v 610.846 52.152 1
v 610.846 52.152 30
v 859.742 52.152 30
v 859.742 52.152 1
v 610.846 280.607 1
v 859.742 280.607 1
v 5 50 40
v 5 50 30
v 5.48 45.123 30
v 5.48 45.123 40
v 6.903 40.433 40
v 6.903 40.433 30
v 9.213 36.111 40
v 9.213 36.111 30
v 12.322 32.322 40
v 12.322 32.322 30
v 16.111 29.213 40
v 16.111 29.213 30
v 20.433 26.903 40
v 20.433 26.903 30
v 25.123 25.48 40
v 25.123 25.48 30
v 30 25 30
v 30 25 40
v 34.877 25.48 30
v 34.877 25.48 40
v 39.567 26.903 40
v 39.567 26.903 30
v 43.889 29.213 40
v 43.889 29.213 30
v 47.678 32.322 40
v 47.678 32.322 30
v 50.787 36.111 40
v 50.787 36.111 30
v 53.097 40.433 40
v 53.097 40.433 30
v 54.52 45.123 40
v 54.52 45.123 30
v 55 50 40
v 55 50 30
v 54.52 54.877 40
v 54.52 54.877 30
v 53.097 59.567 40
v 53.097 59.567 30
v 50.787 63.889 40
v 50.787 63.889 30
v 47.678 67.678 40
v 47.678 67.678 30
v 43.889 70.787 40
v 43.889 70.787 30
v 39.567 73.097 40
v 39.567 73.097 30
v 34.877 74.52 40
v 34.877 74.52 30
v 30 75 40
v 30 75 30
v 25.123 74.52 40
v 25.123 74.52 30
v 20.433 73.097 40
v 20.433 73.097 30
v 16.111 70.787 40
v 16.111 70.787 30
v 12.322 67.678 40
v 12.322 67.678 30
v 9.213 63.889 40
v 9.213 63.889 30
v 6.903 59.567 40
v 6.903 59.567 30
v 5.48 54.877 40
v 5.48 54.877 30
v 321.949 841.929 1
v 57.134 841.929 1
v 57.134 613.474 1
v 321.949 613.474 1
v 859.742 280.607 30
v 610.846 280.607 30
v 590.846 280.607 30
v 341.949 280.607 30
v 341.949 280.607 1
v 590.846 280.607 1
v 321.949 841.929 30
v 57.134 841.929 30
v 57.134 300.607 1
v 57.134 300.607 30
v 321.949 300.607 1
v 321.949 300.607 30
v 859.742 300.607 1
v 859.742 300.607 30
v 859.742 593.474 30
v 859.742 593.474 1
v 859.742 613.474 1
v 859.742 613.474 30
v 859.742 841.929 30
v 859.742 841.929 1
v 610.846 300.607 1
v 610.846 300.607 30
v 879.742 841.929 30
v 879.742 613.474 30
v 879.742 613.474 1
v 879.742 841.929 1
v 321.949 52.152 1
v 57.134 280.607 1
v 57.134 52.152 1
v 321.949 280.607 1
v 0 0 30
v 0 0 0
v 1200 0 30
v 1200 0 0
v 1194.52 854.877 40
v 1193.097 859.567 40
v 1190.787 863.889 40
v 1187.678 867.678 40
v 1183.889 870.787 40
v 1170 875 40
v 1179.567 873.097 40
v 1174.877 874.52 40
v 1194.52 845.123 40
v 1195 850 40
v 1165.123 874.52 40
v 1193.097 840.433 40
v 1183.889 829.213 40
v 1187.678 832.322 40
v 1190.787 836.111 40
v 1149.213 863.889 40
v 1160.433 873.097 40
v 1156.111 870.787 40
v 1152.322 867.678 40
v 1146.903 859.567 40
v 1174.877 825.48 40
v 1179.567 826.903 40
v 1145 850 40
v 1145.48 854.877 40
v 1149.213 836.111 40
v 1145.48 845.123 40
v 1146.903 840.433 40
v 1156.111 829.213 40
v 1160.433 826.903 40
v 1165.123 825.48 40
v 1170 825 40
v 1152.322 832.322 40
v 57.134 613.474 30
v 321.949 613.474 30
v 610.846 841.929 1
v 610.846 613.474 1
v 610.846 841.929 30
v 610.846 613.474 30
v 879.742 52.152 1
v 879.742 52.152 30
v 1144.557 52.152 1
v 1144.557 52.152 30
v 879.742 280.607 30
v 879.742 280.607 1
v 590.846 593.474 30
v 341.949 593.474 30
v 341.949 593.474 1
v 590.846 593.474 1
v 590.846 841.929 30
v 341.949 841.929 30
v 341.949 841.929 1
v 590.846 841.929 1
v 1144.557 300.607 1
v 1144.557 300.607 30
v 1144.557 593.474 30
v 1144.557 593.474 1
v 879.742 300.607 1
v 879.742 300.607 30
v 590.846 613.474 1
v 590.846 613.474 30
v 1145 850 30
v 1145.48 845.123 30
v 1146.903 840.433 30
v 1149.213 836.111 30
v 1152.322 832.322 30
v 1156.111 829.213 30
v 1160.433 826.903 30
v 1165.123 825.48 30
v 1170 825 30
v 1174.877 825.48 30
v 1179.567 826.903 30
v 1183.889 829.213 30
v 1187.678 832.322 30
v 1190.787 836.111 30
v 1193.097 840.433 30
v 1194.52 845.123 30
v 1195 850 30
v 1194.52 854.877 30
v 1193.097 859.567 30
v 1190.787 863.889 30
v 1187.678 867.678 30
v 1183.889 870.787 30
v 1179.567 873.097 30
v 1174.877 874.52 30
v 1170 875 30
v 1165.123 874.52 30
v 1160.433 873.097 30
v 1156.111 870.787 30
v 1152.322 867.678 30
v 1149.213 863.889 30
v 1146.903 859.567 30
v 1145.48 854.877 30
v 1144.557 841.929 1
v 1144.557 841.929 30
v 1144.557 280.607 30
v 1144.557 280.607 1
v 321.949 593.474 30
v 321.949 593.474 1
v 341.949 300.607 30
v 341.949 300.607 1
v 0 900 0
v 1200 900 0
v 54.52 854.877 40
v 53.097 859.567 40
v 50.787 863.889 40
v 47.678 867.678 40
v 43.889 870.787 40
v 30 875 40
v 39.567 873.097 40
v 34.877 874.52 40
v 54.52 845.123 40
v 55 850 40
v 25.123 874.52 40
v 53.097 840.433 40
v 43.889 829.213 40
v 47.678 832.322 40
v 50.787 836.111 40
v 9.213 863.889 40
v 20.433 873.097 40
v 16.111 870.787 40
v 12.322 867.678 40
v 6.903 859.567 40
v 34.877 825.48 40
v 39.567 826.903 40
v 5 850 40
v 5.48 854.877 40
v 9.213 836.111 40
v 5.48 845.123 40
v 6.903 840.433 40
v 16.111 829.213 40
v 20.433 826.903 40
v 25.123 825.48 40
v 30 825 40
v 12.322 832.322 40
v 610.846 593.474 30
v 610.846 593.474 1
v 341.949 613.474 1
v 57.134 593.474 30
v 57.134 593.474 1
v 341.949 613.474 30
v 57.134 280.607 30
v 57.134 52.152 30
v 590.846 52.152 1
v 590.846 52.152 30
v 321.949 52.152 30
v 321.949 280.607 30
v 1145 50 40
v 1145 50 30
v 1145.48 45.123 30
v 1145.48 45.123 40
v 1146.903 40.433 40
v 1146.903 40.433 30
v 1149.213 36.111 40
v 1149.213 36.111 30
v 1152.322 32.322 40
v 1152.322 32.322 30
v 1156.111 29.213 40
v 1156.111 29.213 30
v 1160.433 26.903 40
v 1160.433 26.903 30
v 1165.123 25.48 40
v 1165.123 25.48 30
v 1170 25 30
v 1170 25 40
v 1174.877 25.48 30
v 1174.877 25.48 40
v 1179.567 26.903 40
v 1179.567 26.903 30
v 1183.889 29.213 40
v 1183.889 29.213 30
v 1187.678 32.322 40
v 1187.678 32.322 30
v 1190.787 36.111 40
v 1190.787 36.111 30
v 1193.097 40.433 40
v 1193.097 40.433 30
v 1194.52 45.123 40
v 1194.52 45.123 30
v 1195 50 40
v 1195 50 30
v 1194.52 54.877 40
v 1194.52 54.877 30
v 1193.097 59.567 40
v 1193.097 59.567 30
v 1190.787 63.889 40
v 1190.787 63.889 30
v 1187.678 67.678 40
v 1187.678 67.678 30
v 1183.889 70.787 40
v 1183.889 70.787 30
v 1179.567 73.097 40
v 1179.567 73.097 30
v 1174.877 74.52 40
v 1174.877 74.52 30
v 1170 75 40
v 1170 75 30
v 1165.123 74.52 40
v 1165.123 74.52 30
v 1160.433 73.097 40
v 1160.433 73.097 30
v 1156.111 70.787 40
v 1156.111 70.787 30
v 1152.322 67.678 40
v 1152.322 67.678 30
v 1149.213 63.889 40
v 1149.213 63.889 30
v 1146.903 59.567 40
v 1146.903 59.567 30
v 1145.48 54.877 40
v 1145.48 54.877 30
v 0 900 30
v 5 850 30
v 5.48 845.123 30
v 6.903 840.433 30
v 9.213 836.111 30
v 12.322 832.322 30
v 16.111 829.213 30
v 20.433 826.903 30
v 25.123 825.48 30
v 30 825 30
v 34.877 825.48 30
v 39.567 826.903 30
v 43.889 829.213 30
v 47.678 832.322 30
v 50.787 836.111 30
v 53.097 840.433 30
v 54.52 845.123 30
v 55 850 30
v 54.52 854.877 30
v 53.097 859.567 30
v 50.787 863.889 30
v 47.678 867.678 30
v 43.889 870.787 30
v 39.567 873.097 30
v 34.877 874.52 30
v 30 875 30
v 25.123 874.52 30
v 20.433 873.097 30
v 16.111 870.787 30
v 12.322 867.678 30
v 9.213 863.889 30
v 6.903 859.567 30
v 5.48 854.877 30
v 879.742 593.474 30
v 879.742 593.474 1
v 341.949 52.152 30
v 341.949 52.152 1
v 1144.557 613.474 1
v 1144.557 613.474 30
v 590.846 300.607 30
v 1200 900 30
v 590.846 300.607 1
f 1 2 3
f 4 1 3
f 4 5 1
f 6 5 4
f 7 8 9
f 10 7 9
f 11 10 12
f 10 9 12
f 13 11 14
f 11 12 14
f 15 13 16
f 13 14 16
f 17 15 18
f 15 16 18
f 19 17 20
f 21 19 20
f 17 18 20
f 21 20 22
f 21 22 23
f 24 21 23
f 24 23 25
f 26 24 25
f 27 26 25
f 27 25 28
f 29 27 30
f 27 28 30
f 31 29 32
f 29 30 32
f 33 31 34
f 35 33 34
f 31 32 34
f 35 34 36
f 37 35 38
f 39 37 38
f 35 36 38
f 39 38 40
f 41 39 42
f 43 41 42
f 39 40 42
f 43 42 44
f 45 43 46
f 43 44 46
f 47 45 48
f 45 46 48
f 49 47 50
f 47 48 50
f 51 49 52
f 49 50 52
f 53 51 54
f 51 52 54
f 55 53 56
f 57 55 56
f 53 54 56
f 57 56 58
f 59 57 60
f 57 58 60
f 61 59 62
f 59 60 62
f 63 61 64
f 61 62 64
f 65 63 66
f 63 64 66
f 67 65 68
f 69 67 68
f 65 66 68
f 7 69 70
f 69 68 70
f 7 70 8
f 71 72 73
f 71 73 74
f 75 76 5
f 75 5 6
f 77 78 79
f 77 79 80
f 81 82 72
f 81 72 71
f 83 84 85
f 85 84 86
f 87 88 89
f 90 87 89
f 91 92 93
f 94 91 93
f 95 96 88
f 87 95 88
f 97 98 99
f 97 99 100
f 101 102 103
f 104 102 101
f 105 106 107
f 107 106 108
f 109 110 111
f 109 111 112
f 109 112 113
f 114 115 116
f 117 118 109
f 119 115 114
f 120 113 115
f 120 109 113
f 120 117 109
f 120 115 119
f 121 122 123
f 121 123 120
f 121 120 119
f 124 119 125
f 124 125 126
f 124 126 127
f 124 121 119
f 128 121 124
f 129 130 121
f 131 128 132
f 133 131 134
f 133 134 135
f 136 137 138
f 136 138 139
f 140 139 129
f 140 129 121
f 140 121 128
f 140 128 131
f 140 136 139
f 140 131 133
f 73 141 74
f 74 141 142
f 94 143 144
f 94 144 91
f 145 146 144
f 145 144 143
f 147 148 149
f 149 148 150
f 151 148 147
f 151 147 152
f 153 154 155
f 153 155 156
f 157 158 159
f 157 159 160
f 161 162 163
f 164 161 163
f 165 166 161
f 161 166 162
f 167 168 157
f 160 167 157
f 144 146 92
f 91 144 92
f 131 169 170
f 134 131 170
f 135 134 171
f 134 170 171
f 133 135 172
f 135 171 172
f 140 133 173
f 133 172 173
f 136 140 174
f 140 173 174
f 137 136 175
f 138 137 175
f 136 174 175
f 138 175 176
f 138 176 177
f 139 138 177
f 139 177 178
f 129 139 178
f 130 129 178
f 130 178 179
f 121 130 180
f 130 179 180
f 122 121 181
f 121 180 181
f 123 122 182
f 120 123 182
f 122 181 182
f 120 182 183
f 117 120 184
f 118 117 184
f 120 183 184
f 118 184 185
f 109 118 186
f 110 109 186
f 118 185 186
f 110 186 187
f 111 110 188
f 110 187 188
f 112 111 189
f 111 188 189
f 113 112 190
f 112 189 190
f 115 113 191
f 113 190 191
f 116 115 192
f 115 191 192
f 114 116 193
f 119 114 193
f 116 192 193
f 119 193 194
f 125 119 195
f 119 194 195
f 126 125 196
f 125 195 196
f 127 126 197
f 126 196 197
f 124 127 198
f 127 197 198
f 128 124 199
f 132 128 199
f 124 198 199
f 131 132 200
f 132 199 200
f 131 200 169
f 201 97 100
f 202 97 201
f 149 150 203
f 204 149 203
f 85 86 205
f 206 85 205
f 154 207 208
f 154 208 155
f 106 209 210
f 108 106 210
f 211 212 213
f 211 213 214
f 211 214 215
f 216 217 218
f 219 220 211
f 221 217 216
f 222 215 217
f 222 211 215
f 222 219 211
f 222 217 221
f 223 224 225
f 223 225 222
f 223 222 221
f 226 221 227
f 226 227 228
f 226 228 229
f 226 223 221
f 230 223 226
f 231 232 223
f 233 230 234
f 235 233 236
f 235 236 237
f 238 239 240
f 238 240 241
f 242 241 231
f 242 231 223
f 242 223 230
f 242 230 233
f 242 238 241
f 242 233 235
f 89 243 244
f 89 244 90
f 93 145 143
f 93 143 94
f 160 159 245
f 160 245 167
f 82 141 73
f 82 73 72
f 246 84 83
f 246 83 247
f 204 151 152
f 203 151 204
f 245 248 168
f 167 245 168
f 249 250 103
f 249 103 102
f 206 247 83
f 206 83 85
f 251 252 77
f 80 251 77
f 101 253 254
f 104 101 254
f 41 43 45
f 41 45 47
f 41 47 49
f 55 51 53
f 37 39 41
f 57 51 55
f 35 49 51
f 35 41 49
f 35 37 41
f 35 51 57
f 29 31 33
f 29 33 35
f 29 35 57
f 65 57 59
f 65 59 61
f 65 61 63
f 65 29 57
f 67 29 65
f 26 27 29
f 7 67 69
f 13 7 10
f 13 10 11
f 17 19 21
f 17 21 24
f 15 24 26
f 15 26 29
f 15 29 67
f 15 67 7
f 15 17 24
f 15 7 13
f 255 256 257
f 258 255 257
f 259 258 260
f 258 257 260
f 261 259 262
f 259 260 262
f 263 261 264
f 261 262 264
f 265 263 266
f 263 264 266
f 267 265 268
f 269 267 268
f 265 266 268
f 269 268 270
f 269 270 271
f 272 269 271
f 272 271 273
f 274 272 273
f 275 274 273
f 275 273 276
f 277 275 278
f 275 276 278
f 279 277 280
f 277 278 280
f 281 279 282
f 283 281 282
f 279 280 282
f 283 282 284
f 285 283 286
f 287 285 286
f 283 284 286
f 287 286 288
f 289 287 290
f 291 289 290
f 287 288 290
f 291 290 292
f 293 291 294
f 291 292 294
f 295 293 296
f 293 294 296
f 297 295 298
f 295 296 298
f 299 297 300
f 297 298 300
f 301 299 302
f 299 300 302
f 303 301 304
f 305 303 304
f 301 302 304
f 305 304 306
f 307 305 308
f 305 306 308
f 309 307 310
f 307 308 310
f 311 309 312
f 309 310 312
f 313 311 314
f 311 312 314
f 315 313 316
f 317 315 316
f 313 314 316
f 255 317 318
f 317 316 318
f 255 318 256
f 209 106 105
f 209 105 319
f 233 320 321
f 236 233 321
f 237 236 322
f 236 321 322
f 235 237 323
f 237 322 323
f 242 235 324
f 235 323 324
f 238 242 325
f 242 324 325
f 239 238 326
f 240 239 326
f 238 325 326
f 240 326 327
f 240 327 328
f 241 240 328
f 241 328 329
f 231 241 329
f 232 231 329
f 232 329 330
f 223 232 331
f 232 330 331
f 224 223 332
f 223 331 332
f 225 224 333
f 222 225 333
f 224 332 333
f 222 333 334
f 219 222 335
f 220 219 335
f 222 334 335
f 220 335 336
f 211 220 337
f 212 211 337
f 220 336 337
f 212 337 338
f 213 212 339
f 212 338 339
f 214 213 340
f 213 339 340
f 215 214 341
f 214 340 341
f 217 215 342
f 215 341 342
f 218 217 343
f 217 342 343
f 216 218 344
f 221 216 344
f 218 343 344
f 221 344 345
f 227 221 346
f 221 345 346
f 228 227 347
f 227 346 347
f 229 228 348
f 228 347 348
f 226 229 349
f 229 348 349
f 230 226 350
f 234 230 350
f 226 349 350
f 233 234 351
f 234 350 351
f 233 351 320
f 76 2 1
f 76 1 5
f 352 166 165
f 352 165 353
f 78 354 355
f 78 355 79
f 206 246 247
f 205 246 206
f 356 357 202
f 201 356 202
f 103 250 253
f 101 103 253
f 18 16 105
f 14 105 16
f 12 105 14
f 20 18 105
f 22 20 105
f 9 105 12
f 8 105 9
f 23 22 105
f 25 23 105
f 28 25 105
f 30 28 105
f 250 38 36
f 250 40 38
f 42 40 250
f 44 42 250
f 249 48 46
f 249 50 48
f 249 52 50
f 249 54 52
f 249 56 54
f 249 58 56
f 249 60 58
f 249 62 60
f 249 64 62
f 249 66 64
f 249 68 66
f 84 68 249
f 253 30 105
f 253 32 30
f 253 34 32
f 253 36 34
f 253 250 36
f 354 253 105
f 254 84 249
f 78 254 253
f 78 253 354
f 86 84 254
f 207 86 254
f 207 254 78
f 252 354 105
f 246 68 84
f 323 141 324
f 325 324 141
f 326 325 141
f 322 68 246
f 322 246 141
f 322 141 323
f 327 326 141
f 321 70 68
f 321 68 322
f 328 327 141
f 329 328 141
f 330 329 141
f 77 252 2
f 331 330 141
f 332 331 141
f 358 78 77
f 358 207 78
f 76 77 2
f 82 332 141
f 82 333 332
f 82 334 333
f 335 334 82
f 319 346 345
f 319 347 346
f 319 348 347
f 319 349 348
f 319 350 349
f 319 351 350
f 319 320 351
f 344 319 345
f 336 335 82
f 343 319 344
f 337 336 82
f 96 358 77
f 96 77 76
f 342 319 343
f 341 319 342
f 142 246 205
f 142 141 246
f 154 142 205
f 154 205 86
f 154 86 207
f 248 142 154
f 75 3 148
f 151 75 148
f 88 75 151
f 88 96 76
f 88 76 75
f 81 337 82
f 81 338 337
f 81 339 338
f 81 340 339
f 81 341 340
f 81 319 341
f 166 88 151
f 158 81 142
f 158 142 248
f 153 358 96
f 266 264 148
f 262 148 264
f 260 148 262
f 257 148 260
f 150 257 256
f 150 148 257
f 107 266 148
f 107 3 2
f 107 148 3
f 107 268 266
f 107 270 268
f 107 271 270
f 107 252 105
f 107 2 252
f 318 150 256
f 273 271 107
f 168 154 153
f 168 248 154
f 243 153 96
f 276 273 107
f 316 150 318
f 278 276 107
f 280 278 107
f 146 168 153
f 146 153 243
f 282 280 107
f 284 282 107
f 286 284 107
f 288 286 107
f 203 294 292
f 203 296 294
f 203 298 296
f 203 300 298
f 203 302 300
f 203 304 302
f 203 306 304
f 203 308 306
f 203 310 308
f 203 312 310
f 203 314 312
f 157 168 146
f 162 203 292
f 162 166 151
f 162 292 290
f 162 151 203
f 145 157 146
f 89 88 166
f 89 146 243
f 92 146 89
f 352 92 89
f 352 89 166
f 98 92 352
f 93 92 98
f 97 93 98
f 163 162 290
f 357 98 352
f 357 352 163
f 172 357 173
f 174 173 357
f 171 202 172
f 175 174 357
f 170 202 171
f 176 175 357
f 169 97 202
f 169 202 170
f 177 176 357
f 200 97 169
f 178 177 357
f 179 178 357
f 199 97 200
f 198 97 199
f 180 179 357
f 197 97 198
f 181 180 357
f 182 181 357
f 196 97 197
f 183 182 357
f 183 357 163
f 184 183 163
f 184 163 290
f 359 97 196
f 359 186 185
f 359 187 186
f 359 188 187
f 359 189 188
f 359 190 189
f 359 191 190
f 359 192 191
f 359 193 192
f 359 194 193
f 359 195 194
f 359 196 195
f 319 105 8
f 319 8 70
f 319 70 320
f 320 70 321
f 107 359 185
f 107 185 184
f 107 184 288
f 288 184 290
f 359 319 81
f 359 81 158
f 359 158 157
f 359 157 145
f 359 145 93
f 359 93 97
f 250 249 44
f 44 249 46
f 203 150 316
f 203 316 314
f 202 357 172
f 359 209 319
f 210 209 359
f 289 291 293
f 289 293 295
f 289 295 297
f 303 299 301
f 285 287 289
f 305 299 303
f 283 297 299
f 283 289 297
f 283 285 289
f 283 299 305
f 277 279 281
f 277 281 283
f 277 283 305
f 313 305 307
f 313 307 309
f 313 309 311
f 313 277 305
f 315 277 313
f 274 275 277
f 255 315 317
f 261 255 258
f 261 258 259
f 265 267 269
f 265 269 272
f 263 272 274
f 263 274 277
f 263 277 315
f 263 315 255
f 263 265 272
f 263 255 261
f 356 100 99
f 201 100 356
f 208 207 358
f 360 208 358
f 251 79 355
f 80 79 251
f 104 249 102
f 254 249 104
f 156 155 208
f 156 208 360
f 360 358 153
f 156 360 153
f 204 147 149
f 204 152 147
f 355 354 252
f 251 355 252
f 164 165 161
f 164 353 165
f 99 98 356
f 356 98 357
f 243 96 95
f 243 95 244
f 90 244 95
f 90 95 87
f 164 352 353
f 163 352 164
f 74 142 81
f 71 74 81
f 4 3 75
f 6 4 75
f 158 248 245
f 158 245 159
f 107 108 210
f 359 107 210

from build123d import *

# Parameters (mm, degrees)
SKETCH2_W           = 1200
SKETCH2_H           = 900
BOSS_EXTRUDE2_DEPTH = 30
SKETCH3_W           = 1087.423470631
SKETCH3_H           = 789.777232946
CUT_EXTRUDE2_DEPTH  = 29
RIB6_REACH          = 1502.3
SKETCH6_WALLS_W     = 20
SKETCH6_WALLS_H     = 3792.377172958
SKETCH6_WALLS_W_2   = 4090.023410643
SKETCH6_WALLS_H_2   = 20
SKETCH7_R           = 25
BOSS_EXTRUDE3_DEPTH = 10


with BuildPart() as part:
    # Sketch2 → Boss-Extrude2 (new body)
    with BuildSketch(Plane.XY):
        with Locations((600, 450)):
            Rectangle(SKETCH2_W, SKETCH2_H)
    extrude(amount=BOSS_EXTRUDE2_DEPTH)

    # Sketch3 → Cut-Extrude2 (cut)
    with BuildSketch(Plane.XY.offset(30)):
        with Locations((600.845585903, 447.040449341)):
            Rectangle(SKETCH3_W, SKETCH3_H)
    extrude(amount=-CUT_EXTRUDE2_DEPTH, mode=Mode.SUBTRACT)

    # Sketch6 walls → Rib6 (add, up to next)
    with BuildSketch(Plane.XY.offset(30), mode=Mode.PRIVATE) as rib6_sk1:
        with Locations((600.845585903, 447.040449341)):
            Rectangle(SKETCH6_WALLS_W, SKETCH6_WALLS_H)
    rib6_tool1 = extrude(rib6_sk1.sketch, amount=-RIB6_REACH, mode=Mode.PRIVATE) - part.part
    # Sketch6 walls → Rib6 (add, up to next)
    with BuildSketch(Plane.XY.offset(30), mode=Mode.PRIVATE) as rib6_sk2:
        with Locations((331.949268904, 447.040449341)):
            Rectangle(SKETCH6_WALLS_W, SKETCH6_WALLS_H)
    rib6_tool2 = extrude(rib6_sk2.sketch, amount=-RIB6_REACH, mode=Mode.PRIVATE) - part.part
    # Sketch6 walls → Rib6 (add, up to next)
    with BuildSketch(Plane.XY.offset(30), mode=Mode.PRIVATE) as rib6_sk3:
        with Locations((600.845585903, 603.473841306)):
            Rectangle(SKETCH6_WALLS_W_2, SKETCH6_WALLS_H_2)
    rib6_tool3 = extrude(rib6_sk3.sketch, amount=-RIB6_REACH, mode=Mode.PRIVATE) - part.part
    # Sketch6 walls → Rib6 (add, up to next)
    with BuildSketch(Plane.XY.offset(30), mode=Mode.PRIVATE) as rib6_sk4:
        with Locations((869.741902901, 447.040449341)):
            Rectangle(SKETCH6_WALLS_W, SKETCH6_WALLS_H)
    rib6_tool4 = extrude(rib6_sk4.sketch, amount=-RIB6_REACH, mode=Mode.PRIVATE) - part.part
    # Sketch6 walls → Rib6 (add, up to next)
    with BuildSketch(Plane.XY.offset(30), mode=Mode.PRIVATE) as rib6_sk5:
        with Locations((600.845585903, 290.607057376)):
            Rectangle(SKETCH6_WALLS_W_2, SKETCH6_WALLS_H_2)
    rib6_tool5 = extrude(rib6_sk5.sketch, amount=-RIB6_REACH, mode=Mode.PRIVATE) - part.part
    add(rib6_tool1.solids().sort_by_distance((600.845585903, 447.040449341, 30))[0])
    add(rib6_tool2.solids().sort_by_distance((331.949268904, 447.040449341, 30))[0])
    add(rib6_tool3.solids().sort_by_distance((600.845585903, 603.473841306, 30))[0])
    add(rib6_tool4.solids().sort_by_distance((869.741902901, 447.040449341, 30))[0])
    add(rib6_tool5.solids().sort_by_distance((600.845585903, 290.607057376, 30))[0])

    # Sketch7 → Boss-Extrude3 (add)
    with BuildSketch(Plane.XY.offset(30)):
        with Locations(Location((30, 850, 0), (0, 0, 180))):
            Circle(SKETCH7_R)
        with Locations(Location((30, 50, 0), (0, 0, 180))):
            Circle(SKETCH7_R)
        with Locations(Location((1170, 50, 0), (0, 0, 180))):
            Circle(SKETCH7_R)
        with Locations(Location((1170, 850, 0), (0, 0, 180))):
            Circle(SKETCH7_R)
    extrude(amount=BOSS_EXTRUDE3_DEPTH)


solid = part.part
